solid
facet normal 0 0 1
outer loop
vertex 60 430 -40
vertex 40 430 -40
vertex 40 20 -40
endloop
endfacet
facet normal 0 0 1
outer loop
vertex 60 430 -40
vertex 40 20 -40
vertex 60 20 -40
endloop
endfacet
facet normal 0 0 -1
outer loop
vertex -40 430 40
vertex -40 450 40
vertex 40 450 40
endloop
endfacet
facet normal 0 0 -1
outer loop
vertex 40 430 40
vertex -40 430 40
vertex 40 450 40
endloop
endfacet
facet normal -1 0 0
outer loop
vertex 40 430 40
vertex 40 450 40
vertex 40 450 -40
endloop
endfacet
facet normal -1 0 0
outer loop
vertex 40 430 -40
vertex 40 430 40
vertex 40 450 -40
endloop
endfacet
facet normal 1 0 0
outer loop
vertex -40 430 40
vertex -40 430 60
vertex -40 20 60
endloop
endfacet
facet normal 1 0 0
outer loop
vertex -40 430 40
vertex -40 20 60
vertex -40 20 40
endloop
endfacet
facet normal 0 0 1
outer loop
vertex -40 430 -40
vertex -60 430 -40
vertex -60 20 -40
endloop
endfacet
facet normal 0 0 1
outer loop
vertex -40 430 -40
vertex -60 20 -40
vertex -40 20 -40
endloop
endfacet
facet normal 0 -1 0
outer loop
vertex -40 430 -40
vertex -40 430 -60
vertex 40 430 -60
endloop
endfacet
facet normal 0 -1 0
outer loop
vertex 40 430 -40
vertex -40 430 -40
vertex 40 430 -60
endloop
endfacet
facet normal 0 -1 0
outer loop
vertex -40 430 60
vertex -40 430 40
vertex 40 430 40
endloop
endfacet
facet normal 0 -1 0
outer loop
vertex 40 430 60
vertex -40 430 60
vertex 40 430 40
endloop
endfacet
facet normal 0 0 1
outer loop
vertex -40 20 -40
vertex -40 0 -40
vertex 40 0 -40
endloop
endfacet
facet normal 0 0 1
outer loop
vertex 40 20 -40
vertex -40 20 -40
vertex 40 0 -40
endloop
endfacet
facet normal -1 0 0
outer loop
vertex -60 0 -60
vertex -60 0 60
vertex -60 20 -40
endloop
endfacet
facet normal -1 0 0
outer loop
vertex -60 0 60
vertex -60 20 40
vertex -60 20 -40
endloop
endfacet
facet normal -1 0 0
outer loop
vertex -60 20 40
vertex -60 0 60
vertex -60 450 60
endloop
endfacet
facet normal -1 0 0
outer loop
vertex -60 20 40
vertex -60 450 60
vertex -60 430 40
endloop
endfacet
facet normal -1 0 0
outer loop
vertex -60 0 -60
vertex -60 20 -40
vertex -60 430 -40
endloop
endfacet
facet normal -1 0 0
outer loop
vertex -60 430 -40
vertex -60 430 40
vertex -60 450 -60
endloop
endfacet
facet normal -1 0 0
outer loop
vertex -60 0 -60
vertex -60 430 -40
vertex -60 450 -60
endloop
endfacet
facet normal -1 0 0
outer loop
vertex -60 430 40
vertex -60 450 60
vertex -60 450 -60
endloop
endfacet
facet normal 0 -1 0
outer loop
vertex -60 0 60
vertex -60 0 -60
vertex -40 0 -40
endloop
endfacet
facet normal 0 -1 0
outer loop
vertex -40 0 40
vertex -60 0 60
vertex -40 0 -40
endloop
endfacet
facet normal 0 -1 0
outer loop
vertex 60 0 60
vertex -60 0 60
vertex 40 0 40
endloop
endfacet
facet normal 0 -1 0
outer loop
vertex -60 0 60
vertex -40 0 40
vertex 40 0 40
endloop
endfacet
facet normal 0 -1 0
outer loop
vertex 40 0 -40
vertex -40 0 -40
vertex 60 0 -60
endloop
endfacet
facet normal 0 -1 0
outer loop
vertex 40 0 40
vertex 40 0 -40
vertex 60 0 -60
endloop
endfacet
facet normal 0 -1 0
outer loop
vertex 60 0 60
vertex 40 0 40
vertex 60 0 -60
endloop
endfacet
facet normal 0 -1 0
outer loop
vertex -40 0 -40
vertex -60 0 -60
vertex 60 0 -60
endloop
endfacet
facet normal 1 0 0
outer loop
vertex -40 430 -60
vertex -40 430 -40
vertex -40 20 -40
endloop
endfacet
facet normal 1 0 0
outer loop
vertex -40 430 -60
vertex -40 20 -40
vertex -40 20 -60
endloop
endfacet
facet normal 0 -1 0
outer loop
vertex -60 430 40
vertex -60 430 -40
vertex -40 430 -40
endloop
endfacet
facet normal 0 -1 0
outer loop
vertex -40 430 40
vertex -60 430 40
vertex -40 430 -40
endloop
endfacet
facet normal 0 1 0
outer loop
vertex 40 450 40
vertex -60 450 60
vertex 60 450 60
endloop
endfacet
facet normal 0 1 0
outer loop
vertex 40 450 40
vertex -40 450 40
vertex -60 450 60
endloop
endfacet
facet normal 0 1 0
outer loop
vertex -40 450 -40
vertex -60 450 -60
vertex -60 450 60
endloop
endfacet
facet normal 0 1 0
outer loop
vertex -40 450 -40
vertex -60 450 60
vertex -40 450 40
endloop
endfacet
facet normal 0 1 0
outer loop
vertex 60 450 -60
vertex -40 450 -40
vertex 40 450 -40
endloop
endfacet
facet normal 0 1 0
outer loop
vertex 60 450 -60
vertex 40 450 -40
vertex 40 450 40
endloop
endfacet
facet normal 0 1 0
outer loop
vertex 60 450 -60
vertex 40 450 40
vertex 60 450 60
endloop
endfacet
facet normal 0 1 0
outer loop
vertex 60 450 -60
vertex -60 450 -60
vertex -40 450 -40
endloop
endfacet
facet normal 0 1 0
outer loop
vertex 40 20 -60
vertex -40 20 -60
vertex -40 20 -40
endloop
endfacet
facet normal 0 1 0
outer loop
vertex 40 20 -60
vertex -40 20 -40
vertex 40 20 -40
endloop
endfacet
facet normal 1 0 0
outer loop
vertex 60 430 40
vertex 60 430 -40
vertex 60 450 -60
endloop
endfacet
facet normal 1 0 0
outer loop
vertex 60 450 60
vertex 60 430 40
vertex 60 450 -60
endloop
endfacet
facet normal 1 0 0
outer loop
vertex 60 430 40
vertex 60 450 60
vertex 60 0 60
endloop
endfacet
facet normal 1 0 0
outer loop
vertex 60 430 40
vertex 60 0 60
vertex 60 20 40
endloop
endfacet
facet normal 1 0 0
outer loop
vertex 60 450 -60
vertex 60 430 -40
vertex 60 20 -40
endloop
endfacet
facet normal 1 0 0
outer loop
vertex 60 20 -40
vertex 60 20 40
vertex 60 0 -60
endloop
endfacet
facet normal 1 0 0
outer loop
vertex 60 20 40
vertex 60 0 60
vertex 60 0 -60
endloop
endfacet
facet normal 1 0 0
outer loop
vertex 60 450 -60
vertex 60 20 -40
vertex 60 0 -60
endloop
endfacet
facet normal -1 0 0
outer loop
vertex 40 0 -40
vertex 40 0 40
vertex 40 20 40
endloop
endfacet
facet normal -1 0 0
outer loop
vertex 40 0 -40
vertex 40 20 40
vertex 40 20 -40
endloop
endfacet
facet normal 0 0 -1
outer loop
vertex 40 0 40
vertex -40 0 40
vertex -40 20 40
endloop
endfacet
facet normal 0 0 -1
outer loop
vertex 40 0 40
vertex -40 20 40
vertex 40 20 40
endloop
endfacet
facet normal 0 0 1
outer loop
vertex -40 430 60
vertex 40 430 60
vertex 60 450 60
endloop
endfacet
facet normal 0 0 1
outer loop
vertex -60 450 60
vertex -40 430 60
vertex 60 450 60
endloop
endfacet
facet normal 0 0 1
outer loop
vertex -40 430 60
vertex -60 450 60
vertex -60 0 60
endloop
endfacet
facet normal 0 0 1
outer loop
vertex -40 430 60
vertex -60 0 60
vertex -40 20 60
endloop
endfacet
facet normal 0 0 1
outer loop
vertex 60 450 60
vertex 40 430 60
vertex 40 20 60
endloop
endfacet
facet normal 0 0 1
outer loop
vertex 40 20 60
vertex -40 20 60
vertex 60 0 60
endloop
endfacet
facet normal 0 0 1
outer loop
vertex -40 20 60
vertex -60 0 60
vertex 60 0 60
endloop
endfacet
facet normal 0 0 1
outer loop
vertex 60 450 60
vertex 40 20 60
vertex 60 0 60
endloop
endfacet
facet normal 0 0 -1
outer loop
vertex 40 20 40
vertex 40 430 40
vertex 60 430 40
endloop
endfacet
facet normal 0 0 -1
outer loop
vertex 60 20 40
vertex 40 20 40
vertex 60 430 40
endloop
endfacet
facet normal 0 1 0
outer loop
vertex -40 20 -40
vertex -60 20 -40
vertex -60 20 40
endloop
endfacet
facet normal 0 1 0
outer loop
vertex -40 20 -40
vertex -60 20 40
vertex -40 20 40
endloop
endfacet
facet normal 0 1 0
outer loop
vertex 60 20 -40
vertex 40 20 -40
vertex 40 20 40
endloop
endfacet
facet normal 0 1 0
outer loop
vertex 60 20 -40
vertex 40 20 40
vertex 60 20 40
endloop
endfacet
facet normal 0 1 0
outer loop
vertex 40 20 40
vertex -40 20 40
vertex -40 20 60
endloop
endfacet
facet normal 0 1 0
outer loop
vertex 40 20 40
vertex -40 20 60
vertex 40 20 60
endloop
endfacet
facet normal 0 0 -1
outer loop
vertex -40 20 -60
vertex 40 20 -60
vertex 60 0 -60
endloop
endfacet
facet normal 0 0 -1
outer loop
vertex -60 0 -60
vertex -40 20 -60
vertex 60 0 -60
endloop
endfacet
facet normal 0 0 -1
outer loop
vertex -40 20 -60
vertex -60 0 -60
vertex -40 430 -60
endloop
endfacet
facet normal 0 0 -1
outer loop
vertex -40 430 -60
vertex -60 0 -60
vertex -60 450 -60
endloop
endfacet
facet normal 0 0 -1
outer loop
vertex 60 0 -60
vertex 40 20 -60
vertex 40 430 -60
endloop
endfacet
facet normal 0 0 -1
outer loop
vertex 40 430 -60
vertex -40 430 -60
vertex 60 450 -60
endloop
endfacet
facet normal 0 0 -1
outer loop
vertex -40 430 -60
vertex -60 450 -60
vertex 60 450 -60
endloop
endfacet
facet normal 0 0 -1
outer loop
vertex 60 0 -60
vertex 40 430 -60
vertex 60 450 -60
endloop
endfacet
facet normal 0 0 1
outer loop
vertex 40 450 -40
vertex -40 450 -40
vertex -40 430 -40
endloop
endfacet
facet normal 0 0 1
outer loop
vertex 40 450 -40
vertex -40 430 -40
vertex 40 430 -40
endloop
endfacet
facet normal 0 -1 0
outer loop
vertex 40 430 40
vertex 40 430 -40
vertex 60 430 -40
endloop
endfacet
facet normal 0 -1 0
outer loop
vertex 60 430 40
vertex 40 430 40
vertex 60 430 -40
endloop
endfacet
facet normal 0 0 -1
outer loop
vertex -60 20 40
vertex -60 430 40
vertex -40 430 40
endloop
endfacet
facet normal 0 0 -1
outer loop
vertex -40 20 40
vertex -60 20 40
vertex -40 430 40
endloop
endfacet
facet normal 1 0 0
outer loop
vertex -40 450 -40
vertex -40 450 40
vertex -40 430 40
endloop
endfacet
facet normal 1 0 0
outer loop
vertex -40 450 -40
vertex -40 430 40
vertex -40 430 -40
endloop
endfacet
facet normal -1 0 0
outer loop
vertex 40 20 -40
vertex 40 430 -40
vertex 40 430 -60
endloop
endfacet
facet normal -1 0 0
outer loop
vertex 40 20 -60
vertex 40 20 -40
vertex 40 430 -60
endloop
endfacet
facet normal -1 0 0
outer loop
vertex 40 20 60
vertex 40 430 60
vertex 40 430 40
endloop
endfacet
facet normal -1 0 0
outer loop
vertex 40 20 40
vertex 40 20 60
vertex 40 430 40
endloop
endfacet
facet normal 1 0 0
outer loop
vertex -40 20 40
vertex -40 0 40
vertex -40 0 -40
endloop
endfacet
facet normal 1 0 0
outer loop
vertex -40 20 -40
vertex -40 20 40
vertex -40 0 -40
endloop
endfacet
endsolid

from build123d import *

# Parameters (mm, degrees)
SKETCH1_W           = 120
SKETCH1_H           = 120
SKETCH1_W_2         = 80
SKETCH1_H_2         = 80
BOSS_EXTRUDE1_DEPTH = 20
SKETCH2_W           = 20
SKETCH2_H           = 20
BOSS_EXTRUDE2_DEPTH = 450
SKETCH4_W           = 120
SKETCH4_H           = 120
SKETCH4_W_2         = 80
SKETCH4_H_2         = 80
BOSS_EXTRUDE3_DEPTH = 20


with BuildPart() as part:
    # Sketch1 → Boss-Extrude1 (new body)
    with BuildSketch(Plane(origin=(0, 0, 0), x_dir=(1, 0, 0), z_dir=(0, 1, 0))):
        Rectangle(SKETCH1_W, SKETCH1_H)
        Rectangle(SKETCH1_W_2, SKETCH1_H_2, mode=Mode.SUBTRACT)
    extrude(amount=BOSS_EXTRUDE1_DEPTH)

    # Sketch2 → Boss-Extrude2 (add)
    with BuildSketch(Plane(origin=(0, 450, 0), x_dir=(1, 0, 0), z_dir=(0, 1, 0))):
        with Locations((-50, 50)):
            Rectangle(SKETCH2_W, SKETCH2_H)
        with Locations((50, 50)):
            Rectangle(SKETCH2_W, SKETCH2_H)
        with Locations((50, -50)):
            Rectangle(SKETCH2_W, SKETCH2_H)
        with Locations((-50, -50)):
            Rectangle(SKETCH2_W, SKETCH2_H)
    extrude(amount=-BOSS_EXTRUDE2_DEPTH)

    # Sketch4 → Boss-Extrude3 (add)
    with BuildSketch(Plane(origin=(0, 450, 0), x_dir=(1, 0, 0), z_dir=(0, 1, 0))):
        Rectangle(SKETCH4_W, SKETCH4_H)
        Rectangle(SKETCH4_W_2, SKETCH4_H_2, mode=Mode.SUBTRACT)
    extrude(amount=-BOSS_EXTRUDE3_DEPTH)


solid = part.part
